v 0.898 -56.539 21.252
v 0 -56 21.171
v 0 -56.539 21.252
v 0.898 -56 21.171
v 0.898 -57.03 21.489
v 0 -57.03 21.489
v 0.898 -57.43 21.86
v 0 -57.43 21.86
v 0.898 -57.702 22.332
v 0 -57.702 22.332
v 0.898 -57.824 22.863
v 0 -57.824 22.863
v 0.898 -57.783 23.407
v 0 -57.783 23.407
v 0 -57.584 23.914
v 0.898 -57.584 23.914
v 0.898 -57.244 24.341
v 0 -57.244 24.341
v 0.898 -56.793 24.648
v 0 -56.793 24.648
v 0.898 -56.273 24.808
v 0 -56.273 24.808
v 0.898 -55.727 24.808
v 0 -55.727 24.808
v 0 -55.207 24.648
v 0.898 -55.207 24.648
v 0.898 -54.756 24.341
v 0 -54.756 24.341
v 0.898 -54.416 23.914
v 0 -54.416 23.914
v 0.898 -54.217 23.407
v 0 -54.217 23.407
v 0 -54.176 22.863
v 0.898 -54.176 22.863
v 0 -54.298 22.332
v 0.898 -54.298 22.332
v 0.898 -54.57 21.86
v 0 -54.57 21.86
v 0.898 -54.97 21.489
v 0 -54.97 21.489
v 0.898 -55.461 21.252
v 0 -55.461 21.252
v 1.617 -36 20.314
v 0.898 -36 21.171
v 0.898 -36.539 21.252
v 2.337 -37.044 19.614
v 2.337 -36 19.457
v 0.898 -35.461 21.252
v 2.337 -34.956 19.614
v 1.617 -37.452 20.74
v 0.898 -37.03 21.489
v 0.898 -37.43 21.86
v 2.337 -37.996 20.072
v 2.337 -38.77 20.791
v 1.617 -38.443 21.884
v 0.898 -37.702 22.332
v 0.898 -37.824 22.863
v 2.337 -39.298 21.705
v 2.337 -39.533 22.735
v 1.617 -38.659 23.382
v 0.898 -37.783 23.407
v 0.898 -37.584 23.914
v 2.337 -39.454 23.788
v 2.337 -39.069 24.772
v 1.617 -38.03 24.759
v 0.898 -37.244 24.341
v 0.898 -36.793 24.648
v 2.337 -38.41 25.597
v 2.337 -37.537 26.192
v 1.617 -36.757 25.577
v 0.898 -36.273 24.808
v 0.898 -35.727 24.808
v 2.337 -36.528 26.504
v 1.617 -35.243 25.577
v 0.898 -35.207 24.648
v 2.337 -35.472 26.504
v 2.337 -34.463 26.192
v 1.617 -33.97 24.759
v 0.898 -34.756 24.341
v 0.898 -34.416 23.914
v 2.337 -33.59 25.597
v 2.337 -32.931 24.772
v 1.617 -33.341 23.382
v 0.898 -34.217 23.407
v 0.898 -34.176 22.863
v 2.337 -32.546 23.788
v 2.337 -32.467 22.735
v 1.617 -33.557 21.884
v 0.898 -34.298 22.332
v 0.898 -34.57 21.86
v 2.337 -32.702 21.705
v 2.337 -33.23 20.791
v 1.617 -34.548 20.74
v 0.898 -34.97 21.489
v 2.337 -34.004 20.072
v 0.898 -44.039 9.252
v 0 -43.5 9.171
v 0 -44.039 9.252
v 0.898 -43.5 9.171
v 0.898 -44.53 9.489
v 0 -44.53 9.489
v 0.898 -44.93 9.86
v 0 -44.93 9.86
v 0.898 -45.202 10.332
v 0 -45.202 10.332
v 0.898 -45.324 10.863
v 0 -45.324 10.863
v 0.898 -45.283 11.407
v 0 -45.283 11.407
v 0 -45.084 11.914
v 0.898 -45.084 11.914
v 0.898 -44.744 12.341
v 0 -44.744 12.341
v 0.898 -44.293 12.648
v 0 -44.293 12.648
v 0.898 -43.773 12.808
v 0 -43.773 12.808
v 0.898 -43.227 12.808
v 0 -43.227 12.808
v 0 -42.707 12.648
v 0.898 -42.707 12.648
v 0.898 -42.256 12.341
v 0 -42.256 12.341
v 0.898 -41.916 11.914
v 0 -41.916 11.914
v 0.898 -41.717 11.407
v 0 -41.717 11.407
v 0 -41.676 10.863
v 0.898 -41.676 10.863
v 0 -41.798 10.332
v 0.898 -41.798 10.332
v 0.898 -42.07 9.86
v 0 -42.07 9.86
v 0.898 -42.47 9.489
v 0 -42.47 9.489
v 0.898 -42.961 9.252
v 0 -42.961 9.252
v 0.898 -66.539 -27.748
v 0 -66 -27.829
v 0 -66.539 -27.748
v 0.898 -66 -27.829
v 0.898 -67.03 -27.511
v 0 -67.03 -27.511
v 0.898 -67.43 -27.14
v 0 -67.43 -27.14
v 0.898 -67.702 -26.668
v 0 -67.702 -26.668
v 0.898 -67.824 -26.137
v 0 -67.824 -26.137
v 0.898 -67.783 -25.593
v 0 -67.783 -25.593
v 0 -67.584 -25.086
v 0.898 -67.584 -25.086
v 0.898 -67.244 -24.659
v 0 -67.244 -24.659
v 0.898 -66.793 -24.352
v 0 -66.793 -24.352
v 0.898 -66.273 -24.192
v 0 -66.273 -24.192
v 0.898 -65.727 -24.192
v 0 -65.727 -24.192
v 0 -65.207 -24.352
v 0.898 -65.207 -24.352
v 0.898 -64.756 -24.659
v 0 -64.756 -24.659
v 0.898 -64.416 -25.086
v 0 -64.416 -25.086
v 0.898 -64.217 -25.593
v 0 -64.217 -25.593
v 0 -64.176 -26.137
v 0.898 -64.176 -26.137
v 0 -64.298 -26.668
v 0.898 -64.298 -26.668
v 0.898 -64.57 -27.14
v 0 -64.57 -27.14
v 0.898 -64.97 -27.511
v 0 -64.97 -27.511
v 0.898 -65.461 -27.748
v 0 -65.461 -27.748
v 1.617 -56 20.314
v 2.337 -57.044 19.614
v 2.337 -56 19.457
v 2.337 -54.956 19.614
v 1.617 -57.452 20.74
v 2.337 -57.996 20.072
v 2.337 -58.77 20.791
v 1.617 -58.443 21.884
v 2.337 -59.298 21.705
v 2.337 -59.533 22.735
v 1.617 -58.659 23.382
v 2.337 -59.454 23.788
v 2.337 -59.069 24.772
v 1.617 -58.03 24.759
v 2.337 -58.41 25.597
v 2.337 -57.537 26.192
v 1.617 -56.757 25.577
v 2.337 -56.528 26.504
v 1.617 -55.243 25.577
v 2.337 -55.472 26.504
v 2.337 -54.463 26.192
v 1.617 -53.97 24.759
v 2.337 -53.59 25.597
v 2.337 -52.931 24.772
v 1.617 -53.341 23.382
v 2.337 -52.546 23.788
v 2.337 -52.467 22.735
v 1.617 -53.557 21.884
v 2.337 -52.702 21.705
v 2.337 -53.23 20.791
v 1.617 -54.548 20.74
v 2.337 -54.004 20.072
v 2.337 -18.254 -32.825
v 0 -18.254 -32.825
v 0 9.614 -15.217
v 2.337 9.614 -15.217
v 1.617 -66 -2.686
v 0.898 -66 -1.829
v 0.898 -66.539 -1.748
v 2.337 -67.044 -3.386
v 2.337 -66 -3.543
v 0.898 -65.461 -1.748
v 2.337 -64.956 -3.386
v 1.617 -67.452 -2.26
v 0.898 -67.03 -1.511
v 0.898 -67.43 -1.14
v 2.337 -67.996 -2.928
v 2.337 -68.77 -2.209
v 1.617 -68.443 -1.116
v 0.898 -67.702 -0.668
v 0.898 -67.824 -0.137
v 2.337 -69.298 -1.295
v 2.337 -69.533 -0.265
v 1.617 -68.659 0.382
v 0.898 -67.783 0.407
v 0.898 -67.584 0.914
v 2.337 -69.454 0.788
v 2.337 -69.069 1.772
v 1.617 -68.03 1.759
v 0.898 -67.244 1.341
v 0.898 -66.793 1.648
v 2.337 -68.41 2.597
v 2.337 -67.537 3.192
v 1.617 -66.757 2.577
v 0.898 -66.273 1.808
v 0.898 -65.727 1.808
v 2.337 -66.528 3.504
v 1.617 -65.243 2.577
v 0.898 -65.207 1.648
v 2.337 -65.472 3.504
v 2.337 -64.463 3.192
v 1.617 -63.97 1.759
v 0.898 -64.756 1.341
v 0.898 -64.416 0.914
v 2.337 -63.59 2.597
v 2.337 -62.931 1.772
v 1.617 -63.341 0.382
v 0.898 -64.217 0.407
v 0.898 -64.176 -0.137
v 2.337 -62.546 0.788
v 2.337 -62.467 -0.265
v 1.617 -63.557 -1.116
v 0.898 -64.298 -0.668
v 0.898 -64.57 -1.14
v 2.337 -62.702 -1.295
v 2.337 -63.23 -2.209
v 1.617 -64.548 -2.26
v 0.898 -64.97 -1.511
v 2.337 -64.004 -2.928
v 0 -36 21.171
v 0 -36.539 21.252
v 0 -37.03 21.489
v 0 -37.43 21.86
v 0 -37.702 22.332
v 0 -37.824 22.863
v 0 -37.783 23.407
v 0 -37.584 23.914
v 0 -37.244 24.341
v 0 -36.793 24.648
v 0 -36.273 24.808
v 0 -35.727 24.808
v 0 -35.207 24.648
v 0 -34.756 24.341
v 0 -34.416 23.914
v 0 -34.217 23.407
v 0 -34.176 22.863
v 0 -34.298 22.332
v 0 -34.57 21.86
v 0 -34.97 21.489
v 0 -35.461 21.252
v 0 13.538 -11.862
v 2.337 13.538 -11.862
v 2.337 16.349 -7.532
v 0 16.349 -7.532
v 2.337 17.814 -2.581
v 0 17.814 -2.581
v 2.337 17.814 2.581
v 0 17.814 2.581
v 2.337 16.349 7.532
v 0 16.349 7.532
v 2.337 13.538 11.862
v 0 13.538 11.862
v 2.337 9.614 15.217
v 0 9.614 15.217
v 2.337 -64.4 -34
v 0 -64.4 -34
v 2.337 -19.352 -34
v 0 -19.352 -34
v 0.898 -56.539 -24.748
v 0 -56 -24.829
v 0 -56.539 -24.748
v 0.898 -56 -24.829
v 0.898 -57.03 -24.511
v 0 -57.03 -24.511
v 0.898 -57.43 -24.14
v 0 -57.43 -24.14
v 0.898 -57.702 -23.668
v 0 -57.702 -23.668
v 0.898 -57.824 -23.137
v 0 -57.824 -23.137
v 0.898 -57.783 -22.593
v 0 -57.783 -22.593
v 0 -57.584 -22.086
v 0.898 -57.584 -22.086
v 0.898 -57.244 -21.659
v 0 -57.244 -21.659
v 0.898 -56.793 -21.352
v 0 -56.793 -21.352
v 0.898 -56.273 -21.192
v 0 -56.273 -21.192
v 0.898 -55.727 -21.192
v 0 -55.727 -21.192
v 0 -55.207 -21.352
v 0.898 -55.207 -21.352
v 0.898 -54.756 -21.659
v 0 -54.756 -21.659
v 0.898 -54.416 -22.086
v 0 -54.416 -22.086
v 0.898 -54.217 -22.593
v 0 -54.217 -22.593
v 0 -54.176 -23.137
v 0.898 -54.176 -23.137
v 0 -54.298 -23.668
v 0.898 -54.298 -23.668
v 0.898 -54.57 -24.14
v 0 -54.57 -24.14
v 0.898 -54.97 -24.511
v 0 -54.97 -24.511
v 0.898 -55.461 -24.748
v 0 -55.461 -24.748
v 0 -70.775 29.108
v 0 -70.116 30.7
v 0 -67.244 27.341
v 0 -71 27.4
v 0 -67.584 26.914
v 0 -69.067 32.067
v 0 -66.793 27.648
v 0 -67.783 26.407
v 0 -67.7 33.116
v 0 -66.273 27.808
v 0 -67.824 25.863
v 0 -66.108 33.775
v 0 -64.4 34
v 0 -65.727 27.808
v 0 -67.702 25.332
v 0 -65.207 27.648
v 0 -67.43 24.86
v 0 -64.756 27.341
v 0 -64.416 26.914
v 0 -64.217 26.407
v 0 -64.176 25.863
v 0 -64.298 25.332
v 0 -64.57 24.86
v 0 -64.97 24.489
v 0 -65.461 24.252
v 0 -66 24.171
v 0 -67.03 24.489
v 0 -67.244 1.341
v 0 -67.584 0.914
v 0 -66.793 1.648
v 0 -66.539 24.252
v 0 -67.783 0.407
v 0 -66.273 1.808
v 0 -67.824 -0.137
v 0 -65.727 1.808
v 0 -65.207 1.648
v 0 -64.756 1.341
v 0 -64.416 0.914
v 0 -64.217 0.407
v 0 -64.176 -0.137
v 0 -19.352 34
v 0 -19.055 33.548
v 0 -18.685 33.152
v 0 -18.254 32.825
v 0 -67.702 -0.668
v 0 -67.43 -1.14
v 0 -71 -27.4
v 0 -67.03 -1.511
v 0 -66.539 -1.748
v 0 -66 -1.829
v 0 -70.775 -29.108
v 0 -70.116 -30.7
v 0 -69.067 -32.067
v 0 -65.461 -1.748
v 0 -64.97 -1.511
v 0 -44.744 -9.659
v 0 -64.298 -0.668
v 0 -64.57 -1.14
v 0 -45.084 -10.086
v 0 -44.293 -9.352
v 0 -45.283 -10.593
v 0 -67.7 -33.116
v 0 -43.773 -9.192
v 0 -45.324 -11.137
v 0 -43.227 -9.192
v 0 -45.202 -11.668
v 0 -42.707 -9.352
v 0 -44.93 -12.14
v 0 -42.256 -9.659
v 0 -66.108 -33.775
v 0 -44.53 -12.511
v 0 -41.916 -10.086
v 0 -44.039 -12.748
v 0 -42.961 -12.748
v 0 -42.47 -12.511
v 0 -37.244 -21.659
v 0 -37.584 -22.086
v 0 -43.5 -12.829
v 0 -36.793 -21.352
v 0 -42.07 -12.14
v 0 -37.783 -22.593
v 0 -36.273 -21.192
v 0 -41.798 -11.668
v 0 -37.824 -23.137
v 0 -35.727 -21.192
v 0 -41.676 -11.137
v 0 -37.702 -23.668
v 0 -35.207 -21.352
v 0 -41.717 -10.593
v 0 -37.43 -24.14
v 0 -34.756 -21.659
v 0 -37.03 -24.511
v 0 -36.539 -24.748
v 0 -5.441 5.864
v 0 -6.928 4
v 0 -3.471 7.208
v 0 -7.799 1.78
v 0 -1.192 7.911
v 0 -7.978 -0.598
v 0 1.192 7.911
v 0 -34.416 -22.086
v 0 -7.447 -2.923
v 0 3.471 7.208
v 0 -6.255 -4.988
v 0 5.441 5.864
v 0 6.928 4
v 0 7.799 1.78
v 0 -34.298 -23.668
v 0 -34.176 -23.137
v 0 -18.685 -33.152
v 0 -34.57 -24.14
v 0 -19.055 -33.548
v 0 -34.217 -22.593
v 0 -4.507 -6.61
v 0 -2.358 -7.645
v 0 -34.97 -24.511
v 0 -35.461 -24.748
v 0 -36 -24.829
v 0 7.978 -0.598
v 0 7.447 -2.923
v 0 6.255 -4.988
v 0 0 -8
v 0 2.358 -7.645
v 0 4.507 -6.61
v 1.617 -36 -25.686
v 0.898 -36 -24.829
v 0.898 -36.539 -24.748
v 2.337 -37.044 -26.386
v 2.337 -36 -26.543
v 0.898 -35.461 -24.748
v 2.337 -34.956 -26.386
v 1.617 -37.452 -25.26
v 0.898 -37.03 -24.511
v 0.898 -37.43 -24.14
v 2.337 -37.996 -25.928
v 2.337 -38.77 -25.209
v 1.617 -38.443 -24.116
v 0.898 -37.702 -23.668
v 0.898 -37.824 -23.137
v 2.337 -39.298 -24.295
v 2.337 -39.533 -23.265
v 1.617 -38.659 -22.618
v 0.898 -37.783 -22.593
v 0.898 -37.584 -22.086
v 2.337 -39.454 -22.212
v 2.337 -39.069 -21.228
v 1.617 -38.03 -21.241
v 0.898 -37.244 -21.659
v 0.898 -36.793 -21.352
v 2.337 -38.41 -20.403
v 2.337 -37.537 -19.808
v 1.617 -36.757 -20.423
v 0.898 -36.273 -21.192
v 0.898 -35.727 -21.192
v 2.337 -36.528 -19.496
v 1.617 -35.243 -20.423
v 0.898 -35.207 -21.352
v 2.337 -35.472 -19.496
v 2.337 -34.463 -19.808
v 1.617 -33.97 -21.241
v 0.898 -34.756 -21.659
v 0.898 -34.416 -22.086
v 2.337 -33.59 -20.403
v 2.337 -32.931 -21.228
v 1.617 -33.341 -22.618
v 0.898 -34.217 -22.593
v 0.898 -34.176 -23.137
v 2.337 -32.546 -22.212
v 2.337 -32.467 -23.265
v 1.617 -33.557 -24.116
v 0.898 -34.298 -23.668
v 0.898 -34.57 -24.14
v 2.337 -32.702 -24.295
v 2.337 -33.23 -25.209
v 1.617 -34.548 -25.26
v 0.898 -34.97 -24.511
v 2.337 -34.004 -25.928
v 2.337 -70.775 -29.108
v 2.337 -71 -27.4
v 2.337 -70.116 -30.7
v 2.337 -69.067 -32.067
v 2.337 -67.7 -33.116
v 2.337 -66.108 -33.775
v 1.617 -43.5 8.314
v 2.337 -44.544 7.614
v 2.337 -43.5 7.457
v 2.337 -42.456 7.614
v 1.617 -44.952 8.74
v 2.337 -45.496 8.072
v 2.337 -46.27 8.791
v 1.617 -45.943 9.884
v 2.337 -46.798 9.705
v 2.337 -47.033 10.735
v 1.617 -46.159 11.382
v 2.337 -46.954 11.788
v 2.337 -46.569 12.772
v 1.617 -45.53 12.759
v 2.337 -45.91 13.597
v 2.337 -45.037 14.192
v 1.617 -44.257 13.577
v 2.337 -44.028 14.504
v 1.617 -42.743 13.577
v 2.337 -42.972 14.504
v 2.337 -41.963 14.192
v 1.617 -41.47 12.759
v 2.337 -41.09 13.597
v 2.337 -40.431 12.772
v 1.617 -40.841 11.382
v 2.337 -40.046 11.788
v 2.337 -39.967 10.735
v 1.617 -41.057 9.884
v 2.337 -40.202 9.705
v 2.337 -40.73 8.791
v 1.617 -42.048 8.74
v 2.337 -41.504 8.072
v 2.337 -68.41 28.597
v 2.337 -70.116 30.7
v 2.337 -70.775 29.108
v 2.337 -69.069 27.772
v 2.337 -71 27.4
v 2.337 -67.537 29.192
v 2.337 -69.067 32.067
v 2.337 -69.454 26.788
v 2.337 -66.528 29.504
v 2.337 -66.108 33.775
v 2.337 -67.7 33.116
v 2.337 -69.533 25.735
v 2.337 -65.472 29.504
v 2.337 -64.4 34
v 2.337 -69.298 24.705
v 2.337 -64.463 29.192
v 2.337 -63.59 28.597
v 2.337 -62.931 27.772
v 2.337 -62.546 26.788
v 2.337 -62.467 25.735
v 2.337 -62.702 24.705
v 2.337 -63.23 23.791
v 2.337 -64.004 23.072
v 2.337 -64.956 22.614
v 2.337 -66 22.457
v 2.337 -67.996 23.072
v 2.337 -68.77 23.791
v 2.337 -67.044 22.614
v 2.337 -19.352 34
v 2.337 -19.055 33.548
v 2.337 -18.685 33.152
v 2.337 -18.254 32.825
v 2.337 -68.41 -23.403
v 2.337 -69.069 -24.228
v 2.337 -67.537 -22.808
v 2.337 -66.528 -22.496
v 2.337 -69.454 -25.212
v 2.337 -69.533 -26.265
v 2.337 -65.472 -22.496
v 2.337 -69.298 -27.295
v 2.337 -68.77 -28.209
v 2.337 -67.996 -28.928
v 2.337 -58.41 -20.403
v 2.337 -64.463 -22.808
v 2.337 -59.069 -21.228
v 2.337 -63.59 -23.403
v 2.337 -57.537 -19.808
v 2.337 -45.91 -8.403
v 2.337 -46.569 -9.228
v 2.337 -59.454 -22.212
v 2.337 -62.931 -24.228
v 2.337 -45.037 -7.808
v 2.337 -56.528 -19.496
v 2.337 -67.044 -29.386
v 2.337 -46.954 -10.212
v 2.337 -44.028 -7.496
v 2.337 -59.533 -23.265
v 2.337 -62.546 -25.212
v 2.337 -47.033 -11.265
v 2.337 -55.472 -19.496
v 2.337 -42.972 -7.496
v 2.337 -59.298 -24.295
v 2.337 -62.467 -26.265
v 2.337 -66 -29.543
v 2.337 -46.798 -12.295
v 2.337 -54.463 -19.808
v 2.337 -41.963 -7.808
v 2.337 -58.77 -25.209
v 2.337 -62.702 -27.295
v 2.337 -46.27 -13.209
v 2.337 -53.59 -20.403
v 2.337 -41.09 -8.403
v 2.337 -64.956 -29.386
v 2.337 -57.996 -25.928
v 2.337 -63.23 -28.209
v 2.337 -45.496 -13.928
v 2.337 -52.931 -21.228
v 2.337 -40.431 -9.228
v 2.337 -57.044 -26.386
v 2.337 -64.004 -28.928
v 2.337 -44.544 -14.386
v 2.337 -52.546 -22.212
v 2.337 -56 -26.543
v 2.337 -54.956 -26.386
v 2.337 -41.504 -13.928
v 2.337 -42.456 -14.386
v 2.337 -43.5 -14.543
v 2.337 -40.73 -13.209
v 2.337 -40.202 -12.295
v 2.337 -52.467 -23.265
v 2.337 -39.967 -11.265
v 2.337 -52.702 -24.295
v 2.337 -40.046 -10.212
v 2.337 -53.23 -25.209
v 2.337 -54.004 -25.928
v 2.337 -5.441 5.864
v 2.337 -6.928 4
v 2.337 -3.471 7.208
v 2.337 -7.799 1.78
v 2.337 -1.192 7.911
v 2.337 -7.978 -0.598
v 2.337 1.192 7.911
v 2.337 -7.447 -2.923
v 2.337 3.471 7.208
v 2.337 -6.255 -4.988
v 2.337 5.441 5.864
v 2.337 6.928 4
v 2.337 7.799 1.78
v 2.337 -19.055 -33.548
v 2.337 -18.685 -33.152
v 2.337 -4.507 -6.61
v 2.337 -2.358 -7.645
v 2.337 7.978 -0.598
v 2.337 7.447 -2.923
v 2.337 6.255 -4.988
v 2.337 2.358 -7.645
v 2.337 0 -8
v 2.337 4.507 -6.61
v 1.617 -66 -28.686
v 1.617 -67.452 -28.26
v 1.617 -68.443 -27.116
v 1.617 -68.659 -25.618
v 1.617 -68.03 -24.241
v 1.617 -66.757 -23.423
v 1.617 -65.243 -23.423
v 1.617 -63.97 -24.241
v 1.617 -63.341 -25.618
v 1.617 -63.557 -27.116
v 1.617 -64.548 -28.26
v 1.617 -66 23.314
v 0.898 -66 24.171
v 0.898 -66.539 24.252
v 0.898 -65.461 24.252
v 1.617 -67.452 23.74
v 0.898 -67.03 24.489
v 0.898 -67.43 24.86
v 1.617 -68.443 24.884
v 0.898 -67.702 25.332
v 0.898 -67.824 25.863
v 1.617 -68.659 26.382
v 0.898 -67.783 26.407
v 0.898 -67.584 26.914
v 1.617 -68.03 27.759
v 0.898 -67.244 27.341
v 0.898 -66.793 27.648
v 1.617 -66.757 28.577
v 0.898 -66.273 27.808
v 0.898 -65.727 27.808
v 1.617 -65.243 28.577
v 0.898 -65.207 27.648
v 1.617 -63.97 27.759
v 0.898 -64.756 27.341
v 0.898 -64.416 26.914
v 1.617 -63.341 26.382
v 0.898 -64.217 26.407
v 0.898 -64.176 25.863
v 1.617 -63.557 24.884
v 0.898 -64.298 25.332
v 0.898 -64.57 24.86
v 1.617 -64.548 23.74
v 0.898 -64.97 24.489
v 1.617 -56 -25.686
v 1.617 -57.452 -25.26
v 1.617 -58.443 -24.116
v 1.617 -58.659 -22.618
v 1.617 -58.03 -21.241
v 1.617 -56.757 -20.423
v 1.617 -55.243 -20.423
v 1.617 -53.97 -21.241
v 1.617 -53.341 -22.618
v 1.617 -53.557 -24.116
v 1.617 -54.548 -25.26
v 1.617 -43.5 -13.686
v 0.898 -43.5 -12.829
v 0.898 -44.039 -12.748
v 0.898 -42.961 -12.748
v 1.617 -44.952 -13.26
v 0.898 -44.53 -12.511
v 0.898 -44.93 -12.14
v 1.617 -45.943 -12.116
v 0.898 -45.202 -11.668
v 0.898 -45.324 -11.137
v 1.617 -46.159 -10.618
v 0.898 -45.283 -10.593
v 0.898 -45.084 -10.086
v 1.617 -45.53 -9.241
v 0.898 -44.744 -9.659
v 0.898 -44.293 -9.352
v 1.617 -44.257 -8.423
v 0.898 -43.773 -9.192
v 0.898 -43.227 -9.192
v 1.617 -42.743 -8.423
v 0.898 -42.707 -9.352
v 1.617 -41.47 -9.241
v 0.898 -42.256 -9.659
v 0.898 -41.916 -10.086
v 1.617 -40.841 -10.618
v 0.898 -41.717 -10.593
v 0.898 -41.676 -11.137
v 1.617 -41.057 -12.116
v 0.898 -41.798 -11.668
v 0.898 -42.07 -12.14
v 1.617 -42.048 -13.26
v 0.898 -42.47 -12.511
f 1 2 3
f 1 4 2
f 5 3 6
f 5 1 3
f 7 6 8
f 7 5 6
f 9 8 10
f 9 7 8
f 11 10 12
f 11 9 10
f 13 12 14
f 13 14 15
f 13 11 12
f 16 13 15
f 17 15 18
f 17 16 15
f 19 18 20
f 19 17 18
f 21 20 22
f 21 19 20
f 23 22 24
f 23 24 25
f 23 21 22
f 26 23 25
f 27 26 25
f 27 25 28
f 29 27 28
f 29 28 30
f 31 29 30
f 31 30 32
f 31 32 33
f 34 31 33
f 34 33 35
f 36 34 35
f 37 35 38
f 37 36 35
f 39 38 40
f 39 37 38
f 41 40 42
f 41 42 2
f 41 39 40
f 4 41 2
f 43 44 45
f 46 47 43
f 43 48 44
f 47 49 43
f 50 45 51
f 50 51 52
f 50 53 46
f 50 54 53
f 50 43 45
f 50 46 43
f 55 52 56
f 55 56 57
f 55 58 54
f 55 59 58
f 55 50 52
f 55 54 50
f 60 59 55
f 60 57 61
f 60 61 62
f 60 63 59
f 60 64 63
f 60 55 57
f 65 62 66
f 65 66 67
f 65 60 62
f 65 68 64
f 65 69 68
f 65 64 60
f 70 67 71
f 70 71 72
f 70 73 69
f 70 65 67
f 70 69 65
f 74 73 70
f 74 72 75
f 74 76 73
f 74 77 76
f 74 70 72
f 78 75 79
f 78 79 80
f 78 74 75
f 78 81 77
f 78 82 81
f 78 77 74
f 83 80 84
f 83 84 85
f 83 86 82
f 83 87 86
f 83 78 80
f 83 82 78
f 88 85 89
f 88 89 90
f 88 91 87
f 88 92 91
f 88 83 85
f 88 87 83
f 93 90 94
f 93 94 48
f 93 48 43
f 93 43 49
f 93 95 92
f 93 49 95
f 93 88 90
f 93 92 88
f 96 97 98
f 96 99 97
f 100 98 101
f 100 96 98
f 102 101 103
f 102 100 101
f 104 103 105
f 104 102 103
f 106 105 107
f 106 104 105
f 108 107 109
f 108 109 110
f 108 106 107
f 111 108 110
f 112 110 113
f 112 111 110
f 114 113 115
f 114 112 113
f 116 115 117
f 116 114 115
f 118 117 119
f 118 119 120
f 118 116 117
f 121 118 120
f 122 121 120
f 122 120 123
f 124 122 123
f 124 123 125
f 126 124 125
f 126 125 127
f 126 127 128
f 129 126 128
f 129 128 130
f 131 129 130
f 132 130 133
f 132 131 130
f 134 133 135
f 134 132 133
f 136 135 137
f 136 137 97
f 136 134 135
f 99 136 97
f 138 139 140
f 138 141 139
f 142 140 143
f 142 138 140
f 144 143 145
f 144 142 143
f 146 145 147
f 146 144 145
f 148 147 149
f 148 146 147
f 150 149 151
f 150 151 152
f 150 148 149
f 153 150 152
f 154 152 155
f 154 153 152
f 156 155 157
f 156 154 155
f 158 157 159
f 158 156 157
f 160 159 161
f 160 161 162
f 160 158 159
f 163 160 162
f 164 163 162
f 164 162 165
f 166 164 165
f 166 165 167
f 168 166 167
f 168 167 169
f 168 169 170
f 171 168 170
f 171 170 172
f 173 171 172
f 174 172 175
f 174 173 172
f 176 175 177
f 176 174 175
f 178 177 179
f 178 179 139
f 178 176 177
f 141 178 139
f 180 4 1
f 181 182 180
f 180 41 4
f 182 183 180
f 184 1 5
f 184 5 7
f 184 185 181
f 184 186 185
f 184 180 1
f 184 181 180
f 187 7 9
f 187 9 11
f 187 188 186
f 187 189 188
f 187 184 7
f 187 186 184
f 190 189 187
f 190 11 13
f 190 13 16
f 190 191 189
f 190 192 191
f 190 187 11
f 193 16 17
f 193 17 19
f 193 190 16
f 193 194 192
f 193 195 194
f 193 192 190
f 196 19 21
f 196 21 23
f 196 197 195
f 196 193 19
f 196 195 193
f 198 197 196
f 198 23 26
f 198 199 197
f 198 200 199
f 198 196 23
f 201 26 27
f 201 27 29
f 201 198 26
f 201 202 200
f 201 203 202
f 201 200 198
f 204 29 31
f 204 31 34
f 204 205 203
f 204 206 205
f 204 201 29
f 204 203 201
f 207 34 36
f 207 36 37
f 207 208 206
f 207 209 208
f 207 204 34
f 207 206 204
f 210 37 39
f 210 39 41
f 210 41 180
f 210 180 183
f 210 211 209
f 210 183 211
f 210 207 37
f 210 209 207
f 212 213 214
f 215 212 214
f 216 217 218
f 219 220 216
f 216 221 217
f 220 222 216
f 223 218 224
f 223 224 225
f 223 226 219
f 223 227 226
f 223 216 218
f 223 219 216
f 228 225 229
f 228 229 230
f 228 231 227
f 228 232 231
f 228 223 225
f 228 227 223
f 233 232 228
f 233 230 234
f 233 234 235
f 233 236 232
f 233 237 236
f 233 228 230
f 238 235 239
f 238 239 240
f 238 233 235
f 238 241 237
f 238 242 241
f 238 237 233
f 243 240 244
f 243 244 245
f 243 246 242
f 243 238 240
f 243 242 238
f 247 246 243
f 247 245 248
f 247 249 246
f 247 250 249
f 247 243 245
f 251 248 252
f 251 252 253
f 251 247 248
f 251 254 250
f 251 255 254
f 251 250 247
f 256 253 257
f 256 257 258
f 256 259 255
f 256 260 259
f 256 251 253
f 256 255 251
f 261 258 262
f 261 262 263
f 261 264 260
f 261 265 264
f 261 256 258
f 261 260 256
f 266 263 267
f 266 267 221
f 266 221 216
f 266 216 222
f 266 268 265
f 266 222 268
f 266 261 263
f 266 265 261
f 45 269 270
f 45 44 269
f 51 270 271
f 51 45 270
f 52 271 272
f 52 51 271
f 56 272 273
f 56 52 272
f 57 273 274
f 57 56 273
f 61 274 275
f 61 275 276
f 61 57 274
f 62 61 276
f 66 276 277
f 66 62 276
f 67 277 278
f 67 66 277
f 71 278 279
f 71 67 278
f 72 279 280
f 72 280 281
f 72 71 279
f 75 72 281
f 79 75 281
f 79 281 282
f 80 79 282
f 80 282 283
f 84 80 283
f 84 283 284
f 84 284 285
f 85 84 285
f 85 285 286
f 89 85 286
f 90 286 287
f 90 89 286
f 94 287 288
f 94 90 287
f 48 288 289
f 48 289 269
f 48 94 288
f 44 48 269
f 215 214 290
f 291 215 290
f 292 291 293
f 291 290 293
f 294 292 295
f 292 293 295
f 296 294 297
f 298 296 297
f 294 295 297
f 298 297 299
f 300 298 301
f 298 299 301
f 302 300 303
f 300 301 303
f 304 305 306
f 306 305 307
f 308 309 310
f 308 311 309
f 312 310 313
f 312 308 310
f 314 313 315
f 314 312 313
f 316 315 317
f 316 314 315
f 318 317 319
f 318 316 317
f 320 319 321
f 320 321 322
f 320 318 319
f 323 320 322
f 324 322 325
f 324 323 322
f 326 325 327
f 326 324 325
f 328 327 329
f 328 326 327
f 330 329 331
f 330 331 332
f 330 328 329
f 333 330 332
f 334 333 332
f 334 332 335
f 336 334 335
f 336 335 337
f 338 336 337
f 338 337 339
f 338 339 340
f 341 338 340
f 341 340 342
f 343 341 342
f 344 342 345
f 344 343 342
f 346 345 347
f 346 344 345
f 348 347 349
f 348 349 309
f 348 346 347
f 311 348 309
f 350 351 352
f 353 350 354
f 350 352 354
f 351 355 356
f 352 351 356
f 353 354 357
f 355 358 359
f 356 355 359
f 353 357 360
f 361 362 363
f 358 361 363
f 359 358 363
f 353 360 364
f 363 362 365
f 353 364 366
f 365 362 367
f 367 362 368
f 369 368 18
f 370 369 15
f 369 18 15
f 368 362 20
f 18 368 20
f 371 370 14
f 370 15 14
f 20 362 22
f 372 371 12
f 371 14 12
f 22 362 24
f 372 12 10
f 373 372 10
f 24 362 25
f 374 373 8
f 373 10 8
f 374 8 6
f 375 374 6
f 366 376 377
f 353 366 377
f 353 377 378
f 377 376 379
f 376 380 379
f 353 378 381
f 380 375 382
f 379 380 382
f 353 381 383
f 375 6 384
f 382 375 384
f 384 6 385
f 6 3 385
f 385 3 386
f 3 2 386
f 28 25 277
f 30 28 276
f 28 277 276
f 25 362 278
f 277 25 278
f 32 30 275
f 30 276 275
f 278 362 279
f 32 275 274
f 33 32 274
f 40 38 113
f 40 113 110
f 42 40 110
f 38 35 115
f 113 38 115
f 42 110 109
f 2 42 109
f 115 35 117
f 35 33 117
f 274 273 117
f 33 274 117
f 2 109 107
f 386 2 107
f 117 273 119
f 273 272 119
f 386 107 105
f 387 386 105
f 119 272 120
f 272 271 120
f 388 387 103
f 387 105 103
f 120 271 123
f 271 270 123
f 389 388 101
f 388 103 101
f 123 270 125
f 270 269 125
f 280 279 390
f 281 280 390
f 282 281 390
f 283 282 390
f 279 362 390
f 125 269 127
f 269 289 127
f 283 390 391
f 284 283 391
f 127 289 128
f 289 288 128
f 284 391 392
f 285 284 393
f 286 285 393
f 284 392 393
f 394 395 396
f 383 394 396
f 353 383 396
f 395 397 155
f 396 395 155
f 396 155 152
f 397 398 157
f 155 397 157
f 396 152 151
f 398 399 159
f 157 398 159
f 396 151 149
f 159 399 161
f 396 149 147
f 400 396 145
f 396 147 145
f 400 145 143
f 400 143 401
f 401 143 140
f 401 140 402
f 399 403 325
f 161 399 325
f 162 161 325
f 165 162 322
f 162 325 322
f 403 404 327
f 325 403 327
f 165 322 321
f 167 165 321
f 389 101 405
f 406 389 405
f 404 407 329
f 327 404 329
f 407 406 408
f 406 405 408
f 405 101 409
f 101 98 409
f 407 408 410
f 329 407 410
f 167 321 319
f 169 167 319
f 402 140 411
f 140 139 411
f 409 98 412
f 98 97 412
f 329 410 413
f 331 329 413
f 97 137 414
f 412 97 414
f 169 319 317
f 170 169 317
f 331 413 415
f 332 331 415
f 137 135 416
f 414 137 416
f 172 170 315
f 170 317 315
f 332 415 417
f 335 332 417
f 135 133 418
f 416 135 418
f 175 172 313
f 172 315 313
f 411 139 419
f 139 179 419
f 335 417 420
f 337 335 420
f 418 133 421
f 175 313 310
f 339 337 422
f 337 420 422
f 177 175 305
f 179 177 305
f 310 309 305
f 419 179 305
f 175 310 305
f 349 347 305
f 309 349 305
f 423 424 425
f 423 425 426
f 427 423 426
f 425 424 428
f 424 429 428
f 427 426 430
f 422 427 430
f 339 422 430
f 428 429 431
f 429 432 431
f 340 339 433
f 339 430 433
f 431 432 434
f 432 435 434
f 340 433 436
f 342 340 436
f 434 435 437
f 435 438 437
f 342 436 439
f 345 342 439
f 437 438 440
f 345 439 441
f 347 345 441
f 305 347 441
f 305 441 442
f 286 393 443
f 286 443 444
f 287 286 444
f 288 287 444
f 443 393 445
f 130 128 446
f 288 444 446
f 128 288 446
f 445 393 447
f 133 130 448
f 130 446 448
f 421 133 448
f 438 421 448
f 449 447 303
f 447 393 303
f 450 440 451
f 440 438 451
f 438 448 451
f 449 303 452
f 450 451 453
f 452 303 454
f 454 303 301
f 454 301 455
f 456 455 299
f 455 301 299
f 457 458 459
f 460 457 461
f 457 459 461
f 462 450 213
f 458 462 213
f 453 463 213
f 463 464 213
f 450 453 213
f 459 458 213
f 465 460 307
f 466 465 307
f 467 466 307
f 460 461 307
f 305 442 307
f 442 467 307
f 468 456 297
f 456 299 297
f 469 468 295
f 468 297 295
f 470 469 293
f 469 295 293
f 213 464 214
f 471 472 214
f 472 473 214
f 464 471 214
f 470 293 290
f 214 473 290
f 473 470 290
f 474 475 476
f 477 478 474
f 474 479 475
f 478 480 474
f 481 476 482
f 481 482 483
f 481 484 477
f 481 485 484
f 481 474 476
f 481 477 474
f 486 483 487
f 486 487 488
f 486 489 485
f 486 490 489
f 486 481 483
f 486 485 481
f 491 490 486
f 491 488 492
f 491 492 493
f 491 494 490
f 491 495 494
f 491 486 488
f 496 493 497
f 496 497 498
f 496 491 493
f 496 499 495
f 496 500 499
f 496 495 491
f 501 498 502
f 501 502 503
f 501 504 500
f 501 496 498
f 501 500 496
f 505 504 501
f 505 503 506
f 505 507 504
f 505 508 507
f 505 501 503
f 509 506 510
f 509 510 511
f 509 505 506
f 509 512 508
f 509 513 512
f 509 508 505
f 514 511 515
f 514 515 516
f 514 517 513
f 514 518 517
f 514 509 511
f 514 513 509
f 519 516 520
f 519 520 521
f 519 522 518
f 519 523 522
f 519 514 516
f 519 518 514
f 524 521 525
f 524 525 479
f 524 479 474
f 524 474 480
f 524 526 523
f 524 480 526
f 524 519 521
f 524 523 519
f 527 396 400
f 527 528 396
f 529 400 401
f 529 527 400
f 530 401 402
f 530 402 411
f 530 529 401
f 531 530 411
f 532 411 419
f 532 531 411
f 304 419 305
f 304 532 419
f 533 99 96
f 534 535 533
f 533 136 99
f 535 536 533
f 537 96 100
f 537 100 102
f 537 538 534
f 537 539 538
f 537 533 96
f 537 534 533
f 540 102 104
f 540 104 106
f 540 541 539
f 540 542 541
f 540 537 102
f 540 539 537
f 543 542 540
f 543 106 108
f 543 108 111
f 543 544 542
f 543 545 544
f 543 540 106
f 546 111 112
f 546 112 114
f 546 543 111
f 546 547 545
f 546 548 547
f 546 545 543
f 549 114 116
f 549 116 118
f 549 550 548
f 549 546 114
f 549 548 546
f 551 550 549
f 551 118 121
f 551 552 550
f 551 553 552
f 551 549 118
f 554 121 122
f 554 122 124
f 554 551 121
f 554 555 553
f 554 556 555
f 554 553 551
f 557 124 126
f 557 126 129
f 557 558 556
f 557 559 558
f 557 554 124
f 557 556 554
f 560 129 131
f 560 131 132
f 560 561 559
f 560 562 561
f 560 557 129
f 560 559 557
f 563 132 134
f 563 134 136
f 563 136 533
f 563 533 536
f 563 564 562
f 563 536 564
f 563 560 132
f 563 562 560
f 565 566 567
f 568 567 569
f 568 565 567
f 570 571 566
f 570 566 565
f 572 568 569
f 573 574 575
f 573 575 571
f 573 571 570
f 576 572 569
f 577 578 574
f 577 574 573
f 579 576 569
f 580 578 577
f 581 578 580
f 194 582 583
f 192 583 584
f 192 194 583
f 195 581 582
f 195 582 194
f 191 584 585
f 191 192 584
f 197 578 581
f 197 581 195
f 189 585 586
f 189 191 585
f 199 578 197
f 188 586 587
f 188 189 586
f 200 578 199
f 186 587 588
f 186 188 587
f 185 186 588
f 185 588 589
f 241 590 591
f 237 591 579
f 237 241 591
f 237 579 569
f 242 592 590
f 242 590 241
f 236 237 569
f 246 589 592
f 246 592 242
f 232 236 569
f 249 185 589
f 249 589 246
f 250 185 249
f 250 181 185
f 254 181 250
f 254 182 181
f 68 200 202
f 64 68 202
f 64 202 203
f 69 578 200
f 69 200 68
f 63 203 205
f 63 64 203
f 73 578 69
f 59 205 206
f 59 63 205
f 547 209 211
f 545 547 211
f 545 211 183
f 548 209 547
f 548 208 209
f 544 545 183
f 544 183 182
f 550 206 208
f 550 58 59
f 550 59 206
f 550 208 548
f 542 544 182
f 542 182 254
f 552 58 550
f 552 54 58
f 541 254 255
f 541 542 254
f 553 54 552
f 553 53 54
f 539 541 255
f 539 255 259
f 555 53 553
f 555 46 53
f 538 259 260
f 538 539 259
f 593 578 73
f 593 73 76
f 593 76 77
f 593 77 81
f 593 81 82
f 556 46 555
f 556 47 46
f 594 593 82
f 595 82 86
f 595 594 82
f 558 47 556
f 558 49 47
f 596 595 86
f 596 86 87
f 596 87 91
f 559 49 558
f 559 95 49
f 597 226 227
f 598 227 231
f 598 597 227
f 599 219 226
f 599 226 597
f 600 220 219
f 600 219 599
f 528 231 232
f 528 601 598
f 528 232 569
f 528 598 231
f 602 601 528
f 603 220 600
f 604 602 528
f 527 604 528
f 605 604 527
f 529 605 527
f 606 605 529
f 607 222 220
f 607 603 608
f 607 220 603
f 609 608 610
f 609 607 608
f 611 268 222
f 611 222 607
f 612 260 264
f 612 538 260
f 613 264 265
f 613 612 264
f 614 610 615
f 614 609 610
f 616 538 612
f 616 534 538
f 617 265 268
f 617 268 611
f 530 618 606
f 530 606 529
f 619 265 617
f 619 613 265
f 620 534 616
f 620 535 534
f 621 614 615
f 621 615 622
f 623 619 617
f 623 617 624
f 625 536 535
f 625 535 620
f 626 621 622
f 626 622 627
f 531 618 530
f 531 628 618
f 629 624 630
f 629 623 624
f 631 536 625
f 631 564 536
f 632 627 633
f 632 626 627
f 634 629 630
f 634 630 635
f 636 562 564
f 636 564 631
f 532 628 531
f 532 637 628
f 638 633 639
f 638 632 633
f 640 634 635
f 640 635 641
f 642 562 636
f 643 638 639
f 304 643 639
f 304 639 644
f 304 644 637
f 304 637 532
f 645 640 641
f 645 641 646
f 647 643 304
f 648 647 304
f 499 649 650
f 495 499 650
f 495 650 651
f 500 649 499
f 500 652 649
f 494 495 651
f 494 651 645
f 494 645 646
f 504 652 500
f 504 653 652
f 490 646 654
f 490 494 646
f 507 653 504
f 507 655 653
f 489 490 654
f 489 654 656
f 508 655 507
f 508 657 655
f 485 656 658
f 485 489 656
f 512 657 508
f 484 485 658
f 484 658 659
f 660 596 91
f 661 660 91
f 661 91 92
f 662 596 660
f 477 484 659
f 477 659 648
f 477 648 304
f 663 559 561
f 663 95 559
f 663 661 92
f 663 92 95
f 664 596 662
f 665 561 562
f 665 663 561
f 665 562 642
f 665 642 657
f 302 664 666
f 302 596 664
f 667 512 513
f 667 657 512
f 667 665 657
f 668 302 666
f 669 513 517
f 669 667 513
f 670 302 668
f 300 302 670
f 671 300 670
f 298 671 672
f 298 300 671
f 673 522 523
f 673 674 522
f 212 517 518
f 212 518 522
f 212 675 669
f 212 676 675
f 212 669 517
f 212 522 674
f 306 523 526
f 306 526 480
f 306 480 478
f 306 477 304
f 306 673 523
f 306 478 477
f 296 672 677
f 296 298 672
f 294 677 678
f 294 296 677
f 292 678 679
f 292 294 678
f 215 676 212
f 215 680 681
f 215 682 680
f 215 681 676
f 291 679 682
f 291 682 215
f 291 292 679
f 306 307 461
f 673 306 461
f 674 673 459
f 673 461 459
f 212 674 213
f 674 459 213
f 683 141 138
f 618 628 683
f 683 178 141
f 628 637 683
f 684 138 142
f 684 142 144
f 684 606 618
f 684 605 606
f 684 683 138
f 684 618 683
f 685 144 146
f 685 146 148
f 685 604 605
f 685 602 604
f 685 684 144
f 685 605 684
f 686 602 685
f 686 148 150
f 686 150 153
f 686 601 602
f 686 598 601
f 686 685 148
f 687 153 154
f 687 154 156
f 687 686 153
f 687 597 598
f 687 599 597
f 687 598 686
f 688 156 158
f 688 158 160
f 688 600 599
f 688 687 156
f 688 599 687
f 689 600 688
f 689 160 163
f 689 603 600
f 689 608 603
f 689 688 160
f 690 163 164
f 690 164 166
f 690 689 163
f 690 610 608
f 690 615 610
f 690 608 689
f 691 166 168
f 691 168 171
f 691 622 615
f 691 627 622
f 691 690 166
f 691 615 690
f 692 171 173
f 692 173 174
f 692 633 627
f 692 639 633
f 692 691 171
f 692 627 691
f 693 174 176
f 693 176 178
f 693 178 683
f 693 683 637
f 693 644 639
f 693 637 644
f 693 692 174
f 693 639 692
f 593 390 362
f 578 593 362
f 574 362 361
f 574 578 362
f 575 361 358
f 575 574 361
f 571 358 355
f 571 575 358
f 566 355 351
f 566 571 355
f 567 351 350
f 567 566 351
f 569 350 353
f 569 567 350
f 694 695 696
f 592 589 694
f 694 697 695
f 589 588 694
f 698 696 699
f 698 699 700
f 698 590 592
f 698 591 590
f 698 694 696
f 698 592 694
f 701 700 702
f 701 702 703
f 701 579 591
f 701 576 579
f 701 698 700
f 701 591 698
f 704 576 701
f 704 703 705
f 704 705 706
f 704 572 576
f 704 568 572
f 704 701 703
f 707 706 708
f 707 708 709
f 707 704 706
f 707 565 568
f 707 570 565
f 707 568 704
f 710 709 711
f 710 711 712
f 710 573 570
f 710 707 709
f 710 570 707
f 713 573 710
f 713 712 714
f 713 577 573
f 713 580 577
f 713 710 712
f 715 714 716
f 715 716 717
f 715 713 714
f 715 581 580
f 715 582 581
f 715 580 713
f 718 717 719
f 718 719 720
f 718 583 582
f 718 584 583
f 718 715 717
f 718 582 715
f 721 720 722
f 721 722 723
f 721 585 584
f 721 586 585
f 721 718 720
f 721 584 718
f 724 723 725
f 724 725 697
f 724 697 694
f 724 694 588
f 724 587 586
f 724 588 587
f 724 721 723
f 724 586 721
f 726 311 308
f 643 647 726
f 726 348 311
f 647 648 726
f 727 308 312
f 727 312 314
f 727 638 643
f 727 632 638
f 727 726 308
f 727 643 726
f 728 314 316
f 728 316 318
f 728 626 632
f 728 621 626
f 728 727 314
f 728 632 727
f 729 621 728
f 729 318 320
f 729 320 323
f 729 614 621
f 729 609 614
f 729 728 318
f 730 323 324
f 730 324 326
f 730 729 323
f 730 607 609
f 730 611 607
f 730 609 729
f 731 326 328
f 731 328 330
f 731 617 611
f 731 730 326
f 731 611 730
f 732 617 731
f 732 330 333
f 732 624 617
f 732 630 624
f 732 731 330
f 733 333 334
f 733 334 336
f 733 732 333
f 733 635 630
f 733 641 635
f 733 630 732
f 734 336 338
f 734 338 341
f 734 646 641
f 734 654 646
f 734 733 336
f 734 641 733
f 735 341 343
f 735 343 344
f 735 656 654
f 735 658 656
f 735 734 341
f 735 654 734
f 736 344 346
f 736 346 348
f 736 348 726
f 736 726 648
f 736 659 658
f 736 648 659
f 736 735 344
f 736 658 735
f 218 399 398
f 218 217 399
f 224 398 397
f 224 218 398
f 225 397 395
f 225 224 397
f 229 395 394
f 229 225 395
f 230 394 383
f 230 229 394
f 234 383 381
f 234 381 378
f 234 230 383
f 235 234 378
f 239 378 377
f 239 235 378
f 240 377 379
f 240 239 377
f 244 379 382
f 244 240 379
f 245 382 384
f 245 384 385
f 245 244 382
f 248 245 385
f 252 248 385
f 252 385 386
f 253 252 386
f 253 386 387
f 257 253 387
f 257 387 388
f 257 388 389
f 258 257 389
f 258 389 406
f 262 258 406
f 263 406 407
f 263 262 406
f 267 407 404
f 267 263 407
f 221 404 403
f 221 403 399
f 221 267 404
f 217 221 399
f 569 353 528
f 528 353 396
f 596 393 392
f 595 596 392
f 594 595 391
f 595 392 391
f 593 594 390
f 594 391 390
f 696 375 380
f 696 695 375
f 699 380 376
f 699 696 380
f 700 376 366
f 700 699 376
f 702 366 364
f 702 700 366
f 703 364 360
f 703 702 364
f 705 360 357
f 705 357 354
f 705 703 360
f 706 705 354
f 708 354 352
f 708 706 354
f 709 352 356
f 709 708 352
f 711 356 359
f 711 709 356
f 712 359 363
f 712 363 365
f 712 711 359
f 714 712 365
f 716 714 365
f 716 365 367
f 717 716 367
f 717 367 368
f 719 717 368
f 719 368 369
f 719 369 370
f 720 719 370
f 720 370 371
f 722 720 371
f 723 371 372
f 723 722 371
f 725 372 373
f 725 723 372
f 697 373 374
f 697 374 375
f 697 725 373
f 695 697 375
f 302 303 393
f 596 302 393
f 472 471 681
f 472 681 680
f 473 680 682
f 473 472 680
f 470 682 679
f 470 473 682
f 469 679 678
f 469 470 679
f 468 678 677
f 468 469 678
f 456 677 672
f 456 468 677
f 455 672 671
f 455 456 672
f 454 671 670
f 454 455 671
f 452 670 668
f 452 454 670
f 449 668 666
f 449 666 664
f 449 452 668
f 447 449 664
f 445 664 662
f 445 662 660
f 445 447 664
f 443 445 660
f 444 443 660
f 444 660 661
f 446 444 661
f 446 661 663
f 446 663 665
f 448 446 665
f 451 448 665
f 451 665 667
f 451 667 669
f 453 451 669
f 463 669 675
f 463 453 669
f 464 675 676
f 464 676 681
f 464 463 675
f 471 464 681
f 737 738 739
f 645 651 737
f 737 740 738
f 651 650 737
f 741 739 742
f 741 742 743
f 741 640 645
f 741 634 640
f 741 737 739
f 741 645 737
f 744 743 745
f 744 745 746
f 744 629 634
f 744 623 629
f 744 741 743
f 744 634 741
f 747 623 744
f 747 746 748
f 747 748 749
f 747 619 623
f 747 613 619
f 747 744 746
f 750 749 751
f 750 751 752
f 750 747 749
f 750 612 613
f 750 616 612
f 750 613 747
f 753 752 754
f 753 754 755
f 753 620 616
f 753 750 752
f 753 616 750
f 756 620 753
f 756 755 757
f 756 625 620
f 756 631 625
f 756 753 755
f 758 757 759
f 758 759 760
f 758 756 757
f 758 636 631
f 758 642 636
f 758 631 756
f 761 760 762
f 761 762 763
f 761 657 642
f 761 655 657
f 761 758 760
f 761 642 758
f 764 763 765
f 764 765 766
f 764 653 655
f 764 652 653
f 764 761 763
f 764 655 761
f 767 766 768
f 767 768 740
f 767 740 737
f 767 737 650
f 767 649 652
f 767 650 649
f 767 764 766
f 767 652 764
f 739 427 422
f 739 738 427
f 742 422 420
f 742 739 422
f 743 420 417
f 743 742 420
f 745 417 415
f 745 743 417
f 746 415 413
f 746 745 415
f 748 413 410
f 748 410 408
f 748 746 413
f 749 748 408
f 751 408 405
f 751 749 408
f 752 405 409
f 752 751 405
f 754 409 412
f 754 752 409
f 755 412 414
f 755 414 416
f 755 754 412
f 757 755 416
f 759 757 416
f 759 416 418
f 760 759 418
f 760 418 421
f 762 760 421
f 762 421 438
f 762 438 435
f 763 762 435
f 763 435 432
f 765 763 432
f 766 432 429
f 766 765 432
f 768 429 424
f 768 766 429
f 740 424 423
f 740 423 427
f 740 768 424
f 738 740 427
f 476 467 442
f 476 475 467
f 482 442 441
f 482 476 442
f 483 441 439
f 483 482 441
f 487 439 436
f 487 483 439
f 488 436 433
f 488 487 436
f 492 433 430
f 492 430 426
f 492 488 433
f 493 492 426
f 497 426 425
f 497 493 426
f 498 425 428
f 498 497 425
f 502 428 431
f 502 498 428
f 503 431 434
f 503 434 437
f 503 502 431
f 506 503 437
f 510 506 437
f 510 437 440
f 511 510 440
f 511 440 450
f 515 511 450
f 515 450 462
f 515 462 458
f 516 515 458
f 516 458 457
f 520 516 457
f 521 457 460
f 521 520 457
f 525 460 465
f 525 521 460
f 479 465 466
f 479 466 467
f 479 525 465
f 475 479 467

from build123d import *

# Parameters (mm, degrees)
SKETCH1_R                                 = 8
BOSS_EXTRUDE1_DEPTH                       = 2.3368
CSK_FOR_6_FLAT_HEAD_MACHINE_SCREW_2_COUNT = 2
CSK_FOR_6_FLAT_HEAD_MACHINE_SCREW_2_PITCH = 10.440306509
CSK_FOR_6_FLAT_HEAD_MACHINE_SCREW_3_COUNT = 2
CSK_FOR_6_FLAT_HEAD_MACHINE_SCREW_3_PITCH = 30.149626863
CSK_FOR_6_FLAT_HEAD_MACHINE_SCREW_4_COUNT = 2
CSK_FOR_6_FLAT_HEAD_MACHINE_SCREW_4_PITCH = 27.041634566
CSK_FOR_6_FLAT_HEAD_MACHINE_SCREW_5_COUNT = 2
CSK_FOR_6_FLAT_HEAD_MACHINE_SCREW_5_PITCH = 26
CSK_FOR_6_FLAT_HEAD_MACHINE_SCREW_6_COUNT = 2
CSK_FOR_6_FLAT_HEAD_MACHINE_SCREW_6_PITCH = 52
CSK_FOR_6_FLAT_HEAD_MACHINE_SCREW_7_COUNT = 2
CSK_FOR_6_FLAT_HEAD_MACHINE_SCREW_7_PITCH = 50.009999
CSK_FOR_6_FLAT_HEAD_MACHINE_SCREW_8_COUNT = 2
CSK_FOR_6_FLAT_HEAD_MACHINE_SCREW_8_PITCH = 43.304156844
CSK_FOR_6_FLAT_HEAD_MACHINE_SCREW_9_COUNT = 2
CSK_FOR_6_FLAT_HEAD_MACHINE_SCREW_9_PITCH = 57.454329689
FILLET1_R                                 = 6.6


with BuildPart() as part:
    # Sketch1 → Boss-Extrude1 (new body)
    with BuildSketch(Plane(origin=(0, 0, 0), x_dir=(0, 0, -1), z_dir=(1, 0, 0))):
        with BuildLine():
            Line((-15.217158613, 9.614472619), (-32.825001396, -18.254069638))
            ThreePointArc((-32.825001396, -18.254069638), (-33.341875677, -18.878440867), (-34, -19.351590767))
            Line((-34, -19.351590767), (-34, -71))
            Line((-34, -71), (34, -71))
            Line((34, -71), (34, -19.351590767))
            ThreePointArc((34, -19.351590767), (33.341875677, -18.878440867), (32.825001396, -18.254069638))
            Line((32.825001396, -18.254069638), (15.217158613, 9.614472619))
            ThreePointArc((15.217158613, 9.614472619), (0, 18), (-15.217158613, 9.614472619))
        make_face()
        Circle(SKETCH1_R, mode=Mode.SUBTRACT)
    extrude(amount=BOSS_EXTRUDE1_DEPTH)

    # Sketch4 → CSK for #6 Flat Head Machine Screw (100)1 (revolve, cut)
    with BuildSketch(Plane(origin=(2.3368, -66, 26), x_dir=(0, 0, -1), z_dir=(0, 1, 0))):
        Polygon((0, 0), (0, 2.3368), (1.8288, 2.3368), (1.8288, 1.438636318), (3.5433, 0), align=None)
    csk_for_6_flat_head_machine_screw_100 = revolve(axis=Axis((8.6868, -66, 26), (-1, 0, 0)), mode=Mode.SUBTRACT)

    # CSK for _6 Flat Head Machine Screw _ 2: CSK for #6 Flat Head Machine Screw (100)1 ×2
    with Locations(*[Vector(0, 0.9578262852211523, -0.2873478855663425) * (i * CSK_FOR_6_FLAT_HEAD_MACHINE_SCREW_2_PITCH) for i in range(1, CSK_FOR_6_FLAT_HEAD_MACHINE_SCREW_2_COUNT)]):
        add(csk_for_6_flat_head_machine_screw_100, mode=Mode.SUBTRACT)

    # CSK for _6 Flat Head Machine Screw _ 3: CSK for #6 Flat Head Machine Screw (100)1 ×2
    with Locations(*[Vector(0, 0.9950371902099893, -0.09950371902099815) * (i * CSK_FOR_6_FLAT_HEAD_MACHINE_SCREW_3_PITCH) for i in range(1, CSK_FOR_6_FLAT_HEAD_MACHINE_SCREW_3_COUNT)]):
        add(csk_for_6_flat_head_machine_screw_100, mode=Mode.SUBTRACT)

    # CSK for _6 Flat Head Machine Screw _ 4: CSK for #6 Flat Head Machine Screw (100)1 ×2
    with Locations(*[Vector(0, 0.832050294337844, -0.5547001962252285) * (i * CSK_FOR_6_FLAT_HEAD_MACHINE_SCREW_4_PITCH) for i in range(1, CSK_FOR_6_FLAT_HEAD_MACHINE_SCREW_4_COUNT)]):
        add(csk_for_6_flat_head_machine_screw_100, mode=Mode.SUBTRACT)

    # CSK for _6 Flat Head Machine Screw _ 5: CSK for #6 Flat Head Machine Screw (100)1 ×2
    with Locations(*[(0, 0, -i * CSK_FOR_6_FLAT_HEAD_MACHINE_SCREW_5_PITCH) for i in range(1, CSK_FOR_6_FLAT_HEAD_MACHINE_SCREW_5_COUNT)]):
        add(csk_for_6_flat_head_machine_screw_100, mode=Mode.SUBTRACT)

    # CSK for _6 Flat Head Machine Screw _ 6: CSK for #6 Flat Head Machine Screw (100)1 ×2
    with Locations(*[(0, 0, -i * CSK_FOR_6_FLAT_HEAD_MACHINE_SCREW_6_PITCH) for i in range(1, CSK_FOR_6_FLAT_HEAD_MACHINE_SCREW_6_COUNT)]):
        add(csk_for_6_flat_head_machine_screw_100, mode=Mode.SUBTRACT)

    # CSK for _6 Flat Head Machine Screw _ 7: CSK for #6 Flat Head Machine Screw (100)1 ×2
    with Locations(*[Vector(0, 0.19996001199600139, -0.9798040587804069) * (i * CSK_FOR_6_FLAT_HEAD_MACHINE_SCREW_7_PITCH) for i in range(1, CSK_FOR_6_FLAT_HEAD_MACHINE_SCREW_7_COUNT)]):
        add(csk_for_6_flat_head_machine_screw_100, mode=Mode.SUBTRACT)

    # CSK for _6 Flat Head Machine Screw _ 8: CSK for #6 Flat Head Machine Screw (100)1 ×2
    with Locations(*[Vector(0, 0.5195806047182286, -0.8544214388699759) * (i * CSK_FOR_6_FLAT_HEAD_MACHINE_SCREW_8_PITCH) for i in range(1, CSK_FOR_6_FLAT_HEAD_MACHINE_SCREW_8_COUNT)]):
        add(csk_for_6_flat_head_machine_screw_100, mode=Mode.SUBTRACT)

    # CSK for _6 Flat Head Machine Screw _ 9: CSK for #6 Flat Head Machine Screw (100)1 ×2
    with Locations(*[Vector(0, 0.52215385963853, -0.8528513040762653) * (i * CSK_FOR_6_FLAT_HEAD_MACHINE_SCREW_9_PITCH) for i in range(1, CSK_FOR_6_FLAT_HEAD_MACHINE_SCREW_9_COUNT)]):
        add(csk_for_6_flat_head_machine_screw_100, mode=Mode.SUBTRACT)

    # Fillet1
    fillet1_edges = [part.edges().sort_by_distance(p)[0] for p in [
        (1.1684, -71, -34),
        (1.1684, -71, 34),
    ]]
    fillet(fillet1_edges, radius=FILLET1_R)


solid = part.part
